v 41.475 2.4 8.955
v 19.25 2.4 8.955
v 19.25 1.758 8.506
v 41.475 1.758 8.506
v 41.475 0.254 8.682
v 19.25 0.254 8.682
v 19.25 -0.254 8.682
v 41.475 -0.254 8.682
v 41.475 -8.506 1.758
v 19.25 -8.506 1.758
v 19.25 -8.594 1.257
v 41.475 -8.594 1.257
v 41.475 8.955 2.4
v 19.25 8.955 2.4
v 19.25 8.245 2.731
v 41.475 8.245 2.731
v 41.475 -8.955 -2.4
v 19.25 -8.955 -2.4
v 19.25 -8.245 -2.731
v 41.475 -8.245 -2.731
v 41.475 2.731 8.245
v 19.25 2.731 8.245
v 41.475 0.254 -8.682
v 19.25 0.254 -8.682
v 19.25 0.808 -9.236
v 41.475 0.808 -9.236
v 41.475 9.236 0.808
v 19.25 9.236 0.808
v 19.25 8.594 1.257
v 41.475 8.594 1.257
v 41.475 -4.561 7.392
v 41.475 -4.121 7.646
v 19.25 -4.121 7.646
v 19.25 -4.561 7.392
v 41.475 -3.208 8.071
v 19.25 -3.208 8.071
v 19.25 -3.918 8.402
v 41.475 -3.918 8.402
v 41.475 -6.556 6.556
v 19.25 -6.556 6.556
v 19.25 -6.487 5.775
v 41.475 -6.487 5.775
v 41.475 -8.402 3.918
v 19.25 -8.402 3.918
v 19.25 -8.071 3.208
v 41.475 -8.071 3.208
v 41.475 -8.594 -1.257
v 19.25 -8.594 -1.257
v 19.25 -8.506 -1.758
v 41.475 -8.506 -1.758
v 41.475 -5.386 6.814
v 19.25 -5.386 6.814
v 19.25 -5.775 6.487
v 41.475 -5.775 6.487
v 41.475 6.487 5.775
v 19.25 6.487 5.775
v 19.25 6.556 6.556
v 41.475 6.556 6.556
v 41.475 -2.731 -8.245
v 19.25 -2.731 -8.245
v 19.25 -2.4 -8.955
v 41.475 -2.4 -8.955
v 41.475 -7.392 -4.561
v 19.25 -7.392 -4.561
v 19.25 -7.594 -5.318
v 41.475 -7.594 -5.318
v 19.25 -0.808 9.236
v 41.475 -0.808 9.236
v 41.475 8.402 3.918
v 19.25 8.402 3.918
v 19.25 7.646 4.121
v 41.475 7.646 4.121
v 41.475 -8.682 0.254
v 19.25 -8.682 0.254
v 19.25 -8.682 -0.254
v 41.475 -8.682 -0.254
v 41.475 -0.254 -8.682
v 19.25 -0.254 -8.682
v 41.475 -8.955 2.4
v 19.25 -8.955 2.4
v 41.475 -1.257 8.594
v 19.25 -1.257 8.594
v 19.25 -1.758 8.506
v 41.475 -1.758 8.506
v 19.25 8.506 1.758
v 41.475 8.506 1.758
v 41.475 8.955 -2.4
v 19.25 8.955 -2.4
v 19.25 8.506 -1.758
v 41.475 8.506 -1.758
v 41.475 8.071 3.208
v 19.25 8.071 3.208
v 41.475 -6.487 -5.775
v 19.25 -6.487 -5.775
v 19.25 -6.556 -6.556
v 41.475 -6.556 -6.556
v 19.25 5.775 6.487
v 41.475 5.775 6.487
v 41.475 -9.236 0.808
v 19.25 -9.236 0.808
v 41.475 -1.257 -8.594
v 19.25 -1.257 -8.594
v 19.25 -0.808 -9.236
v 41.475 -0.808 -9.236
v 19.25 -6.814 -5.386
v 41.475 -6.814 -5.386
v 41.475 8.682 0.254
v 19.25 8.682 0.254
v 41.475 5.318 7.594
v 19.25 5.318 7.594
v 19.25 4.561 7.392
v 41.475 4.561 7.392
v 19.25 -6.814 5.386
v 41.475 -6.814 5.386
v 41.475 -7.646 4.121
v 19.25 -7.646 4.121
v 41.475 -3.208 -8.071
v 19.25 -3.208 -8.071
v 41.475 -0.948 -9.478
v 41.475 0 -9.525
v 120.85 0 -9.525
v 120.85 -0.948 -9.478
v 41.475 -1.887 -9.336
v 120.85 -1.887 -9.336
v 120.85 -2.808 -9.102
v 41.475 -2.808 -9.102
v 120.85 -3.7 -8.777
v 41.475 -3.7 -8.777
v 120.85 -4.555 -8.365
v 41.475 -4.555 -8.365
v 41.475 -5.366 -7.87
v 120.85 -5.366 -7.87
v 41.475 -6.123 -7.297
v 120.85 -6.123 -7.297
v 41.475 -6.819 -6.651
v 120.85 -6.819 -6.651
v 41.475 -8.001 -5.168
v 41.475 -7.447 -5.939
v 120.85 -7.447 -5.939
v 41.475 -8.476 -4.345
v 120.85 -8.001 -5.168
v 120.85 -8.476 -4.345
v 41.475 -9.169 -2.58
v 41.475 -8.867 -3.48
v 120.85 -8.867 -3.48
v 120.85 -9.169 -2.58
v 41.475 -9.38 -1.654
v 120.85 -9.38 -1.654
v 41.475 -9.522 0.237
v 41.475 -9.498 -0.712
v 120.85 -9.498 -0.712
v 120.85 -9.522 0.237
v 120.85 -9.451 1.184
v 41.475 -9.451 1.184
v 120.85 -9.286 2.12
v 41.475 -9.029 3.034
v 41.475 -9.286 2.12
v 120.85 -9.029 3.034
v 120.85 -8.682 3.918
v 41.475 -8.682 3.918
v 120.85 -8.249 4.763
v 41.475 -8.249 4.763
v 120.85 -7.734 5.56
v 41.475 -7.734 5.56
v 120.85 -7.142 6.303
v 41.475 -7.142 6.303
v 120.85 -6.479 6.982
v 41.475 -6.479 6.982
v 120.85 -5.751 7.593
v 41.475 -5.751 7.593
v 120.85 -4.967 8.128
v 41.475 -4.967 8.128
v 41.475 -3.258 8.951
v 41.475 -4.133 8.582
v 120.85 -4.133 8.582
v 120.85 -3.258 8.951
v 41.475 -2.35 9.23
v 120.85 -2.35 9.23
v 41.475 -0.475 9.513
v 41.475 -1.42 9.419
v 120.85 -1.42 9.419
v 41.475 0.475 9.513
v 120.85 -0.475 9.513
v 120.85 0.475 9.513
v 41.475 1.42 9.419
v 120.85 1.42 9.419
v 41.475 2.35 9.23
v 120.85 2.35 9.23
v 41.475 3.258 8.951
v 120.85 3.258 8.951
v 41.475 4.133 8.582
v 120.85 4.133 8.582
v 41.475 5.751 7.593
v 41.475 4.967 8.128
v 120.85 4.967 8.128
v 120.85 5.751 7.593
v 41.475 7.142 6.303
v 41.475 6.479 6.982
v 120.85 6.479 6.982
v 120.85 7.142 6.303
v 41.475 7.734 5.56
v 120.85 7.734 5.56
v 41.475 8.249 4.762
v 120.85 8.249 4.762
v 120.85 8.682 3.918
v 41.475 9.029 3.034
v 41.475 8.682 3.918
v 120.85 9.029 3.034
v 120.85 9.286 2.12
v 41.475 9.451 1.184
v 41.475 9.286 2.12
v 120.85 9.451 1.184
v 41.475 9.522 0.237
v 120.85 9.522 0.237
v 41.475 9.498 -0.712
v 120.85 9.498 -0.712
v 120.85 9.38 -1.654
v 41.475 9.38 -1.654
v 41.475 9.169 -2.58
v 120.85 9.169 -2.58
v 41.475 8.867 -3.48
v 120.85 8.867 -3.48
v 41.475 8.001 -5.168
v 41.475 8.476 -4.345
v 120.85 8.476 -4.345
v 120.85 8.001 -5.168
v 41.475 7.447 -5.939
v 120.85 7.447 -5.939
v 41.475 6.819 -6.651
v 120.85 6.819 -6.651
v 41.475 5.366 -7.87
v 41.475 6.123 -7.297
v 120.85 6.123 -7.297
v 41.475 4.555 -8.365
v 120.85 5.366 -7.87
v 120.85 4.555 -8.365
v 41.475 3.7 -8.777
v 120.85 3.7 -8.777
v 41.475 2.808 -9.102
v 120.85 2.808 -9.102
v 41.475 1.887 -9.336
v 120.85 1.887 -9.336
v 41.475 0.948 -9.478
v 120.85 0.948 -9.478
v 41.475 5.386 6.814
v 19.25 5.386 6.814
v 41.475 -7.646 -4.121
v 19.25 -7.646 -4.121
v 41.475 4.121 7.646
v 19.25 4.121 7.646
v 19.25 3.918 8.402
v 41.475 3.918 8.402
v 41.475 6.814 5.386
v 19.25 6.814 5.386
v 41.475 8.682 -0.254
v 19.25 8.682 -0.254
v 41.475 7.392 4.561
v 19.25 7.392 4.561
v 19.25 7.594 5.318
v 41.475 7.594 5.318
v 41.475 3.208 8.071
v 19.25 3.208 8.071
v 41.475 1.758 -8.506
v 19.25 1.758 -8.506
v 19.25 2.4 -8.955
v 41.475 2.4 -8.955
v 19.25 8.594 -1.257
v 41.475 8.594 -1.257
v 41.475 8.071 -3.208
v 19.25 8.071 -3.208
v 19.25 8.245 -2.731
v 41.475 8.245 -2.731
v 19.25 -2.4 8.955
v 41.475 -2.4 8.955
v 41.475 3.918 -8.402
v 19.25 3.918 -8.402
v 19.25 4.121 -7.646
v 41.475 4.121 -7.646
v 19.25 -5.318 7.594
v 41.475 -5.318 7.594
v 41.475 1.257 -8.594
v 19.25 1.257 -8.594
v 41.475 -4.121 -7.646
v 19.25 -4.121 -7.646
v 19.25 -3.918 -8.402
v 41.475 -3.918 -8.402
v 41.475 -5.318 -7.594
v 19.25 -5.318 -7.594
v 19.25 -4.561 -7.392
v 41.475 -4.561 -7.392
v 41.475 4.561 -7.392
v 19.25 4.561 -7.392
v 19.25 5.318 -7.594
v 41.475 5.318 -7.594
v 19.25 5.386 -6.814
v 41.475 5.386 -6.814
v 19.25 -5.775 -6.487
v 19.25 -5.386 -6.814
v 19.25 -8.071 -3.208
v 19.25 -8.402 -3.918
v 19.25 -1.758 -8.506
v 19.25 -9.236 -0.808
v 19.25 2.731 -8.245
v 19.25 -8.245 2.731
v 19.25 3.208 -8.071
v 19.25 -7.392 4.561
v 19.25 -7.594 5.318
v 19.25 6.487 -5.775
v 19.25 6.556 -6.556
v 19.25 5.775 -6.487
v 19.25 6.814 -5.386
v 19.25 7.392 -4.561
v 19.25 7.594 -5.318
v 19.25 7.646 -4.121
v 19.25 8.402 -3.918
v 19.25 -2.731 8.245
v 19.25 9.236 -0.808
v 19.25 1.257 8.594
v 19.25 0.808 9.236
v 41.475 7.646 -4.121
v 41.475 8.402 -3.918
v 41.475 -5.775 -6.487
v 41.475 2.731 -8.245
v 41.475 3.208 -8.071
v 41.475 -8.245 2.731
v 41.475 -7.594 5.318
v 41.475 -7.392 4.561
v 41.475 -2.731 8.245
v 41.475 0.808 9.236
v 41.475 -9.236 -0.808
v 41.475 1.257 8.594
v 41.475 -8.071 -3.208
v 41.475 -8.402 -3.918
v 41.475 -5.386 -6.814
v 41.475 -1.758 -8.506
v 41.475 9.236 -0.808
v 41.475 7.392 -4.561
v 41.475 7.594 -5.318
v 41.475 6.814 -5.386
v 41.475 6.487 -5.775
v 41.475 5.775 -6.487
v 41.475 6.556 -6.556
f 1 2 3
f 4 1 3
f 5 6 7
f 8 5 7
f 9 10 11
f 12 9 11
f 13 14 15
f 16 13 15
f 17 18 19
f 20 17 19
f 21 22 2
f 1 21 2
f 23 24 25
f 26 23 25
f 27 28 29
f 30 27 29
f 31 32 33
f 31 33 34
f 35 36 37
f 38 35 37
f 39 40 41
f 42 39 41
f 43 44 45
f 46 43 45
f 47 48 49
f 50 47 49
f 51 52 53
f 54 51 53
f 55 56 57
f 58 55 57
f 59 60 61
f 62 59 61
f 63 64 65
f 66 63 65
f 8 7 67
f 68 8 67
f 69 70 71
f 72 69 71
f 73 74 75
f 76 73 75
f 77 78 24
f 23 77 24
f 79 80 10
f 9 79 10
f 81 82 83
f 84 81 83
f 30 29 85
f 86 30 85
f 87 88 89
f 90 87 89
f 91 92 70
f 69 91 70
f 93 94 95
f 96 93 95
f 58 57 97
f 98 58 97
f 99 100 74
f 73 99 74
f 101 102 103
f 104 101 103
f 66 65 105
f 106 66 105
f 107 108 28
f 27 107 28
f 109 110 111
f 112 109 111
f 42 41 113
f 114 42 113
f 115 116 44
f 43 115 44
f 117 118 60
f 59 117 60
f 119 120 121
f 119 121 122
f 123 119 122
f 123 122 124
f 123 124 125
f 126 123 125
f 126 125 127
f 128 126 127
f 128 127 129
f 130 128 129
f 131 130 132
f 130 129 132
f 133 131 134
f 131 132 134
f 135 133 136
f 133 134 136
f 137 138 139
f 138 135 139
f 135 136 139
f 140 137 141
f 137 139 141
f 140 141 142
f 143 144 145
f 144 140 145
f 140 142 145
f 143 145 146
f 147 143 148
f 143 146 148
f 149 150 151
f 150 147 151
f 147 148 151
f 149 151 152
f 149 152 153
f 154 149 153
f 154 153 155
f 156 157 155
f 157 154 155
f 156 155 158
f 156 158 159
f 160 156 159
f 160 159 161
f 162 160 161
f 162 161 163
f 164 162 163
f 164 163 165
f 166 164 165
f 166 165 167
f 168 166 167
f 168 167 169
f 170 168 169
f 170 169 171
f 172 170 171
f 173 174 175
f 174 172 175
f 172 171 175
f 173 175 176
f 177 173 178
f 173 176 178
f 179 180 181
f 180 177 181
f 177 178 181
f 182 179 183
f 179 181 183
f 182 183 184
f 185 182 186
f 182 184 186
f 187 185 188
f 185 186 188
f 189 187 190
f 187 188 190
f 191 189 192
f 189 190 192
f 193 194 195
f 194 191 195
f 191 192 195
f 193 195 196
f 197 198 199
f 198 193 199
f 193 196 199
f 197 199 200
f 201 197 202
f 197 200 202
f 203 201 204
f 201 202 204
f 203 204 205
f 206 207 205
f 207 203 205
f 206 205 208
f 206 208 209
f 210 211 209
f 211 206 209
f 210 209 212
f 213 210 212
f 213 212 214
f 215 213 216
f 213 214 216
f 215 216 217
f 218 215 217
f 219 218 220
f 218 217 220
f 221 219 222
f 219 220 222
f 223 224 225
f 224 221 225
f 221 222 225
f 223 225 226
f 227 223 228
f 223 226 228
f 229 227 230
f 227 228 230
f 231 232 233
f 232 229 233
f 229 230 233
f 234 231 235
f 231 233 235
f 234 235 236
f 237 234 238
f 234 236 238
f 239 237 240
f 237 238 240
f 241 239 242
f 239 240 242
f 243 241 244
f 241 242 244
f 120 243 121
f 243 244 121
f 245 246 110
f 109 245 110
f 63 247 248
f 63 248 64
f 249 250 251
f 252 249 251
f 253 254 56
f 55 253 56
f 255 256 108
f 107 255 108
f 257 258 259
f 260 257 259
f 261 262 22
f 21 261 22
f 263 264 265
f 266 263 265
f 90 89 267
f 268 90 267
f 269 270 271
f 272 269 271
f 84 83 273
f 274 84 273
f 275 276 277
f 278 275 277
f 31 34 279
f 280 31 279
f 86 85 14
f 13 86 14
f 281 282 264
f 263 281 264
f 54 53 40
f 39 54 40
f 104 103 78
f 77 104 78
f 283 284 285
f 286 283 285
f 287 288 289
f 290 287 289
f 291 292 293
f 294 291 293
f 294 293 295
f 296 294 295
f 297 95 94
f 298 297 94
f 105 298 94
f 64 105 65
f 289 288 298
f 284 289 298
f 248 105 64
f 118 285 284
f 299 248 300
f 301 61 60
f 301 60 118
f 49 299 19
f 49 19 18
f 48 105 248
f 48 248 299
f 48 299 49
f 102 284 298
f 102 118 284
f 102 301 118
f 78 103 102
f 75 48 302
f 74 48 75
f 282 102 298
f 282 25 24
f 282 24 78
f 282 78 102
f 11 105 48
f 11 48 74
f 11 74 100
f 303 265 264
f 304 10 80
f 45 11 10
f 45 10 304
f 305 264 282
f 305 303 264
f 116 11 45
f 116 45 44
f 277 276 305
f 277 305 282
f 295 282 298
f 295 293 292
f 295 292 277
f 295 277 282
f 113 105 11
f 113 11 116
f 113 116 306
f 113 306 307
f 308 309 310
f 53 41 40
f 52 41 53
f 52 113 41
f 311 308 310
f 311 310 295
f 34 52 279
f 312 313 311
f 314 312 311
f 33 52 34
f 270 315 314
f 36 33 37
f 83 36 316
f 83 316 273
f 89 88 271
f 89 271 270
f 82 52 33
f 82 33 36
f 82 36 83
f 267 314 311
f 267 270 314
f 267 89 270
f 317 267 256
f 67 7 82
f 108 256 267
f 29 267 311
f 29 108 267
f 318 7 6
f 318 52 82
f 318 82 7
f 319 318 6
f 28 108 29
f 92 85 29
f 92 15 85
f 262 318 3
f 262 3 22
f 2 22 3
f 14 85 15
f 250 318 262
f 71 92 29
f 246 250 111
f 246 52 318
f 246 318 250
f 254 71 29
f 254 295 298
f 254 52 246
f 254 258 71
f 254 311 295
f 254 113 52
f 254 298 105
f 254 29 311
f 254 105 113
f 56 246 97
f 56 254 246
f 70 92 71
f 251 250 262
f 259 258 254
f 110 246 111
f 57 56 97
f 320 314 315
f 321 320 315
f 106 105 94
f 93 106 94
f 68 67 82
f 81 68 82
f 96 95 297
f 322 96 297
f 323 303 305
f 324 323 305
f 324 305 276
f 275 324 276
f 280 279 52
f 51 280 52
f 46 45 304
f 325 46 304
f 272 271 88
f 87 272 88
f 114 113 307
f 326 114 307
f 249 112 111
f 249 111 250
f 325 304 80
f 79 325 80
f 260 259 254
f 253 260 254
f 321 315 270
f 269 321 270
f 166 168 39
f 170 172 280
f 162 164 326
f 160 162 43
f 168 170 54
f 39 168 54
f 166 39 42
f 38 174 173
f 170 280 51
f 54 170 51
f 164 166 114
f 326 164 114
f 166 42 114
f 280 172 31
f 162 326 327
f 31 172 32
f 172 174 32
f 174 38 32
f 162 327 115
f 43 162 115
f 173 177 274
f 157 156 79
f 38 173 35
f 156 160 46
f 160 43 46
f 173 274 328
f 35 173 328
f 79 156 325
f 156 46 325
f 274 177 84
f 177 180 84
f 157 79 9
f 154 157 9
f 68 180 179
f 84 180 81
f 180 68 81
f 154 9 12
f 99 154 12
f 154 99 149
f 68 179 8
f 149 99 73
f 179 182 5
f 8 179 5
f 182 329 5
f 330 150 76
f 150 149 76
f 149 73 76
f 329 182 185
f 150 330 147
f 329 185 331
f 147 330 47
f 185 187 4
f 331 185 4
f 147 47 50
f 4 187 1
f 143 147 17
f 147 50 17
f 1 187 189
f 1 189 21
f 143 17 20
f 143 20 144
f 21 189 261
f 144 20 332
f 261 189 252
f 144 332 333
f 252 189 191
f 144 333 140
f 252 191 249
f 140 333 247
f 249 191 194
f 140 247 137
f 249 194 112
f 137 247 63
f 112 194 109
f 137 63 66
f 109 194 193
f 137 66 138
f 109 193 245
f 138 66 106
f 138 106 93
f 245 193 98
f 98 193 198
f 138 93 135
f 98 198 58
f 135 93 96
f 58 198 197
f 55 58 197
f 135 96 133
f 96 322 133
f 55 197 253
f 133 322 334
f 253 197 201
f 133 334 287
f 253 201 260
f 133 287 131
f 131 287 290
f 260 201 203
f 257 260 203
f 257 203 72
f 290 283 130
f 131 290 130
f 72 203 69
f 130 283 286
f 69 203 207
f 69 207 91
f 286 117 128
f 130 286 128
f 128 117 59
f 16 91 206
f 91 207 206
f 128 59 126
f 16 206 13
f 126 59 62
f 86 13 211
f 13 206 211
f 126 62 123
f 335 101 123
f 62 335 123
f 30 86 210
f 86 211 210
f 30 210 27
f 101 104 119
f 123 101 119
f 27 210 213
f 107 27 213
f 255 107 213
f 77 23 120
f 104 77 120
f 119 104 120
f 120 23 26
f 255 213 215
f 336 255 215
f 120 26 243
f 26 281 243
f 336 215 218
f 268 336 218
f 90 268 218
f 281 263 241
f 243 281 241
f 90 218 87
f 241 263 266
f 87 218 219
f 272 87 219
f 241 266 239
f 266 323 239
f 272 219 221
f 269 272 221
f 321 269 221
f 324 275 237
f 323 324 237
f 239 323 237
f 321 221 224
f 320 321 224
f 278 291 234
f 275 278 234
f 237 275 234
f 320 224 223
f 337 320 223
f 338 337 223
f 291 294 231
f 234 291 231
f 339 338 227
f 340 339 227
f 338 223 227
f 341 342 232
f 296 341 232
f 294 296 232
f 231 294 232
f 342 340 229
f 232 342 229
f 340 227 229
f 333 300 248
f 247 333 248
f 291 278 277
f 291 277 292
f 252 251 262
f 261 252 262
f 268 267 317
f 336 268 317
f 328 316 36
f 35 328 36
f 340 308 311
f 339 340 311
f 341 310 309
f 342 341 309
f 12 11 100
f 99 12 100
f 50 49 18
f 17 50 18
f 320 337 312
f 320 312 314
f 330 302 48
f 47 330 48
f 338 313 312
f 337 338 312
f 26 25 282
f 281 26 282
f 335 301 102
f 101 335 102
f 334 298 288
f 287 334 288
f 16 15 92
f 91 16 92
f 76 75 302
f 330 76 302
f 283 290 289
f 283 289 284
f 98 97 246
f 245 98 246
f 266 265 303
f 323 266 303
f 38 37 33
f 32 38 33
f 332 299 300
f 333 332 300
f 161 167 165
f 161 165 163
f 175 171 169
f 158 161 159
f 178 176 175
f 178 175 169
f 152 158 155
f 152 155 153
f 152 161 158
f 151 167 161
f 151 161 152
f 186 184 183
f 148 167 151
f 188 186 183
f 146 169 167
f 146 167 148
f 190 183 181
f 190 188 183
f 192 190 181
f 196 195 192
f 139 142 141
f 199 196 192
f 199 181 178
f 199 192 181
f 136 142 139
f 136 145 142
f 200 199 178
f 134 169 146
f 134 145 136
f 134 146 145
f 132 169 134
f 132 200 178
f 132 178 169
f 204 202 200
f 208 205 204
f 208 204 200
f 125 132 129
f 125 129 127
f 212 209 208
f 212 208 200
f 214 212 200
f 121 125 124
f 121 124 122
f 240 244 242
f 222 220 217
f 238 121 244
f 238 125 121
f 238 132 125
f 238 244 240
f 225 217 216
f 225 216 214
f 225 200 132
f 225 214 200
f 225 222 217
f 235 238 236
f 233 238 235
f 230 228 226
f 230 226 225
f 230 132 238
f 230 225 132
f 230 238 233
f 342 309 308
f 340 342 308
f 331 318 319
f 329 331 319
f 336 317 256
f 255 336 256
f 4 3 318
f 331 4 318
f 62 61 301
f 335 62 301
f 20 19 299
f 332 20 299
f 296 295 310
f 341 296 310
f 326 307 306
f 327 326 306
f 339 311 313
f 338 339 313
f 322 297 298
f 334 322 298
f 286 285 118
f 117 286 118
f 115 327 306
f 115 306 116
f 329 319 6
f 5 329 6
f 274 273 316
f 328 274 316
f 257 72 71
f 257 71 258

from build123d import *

# Parameters (mm, degrees)
SKETCH1_W           = 120.675
SKETCH1_H           = 1.5875
CUT_EXTRUDE2_START  = 19.25
SKETCH4_R           = 12.7
CUT_EXTRUDE2_DEPTH  = 22.225
SKETCH6_R           = 7.9375
BOSS_EXTRUDE1_DEPTH = 101.6
SKETCH7_R           = 23.308025585
CUT_EXTRUDE3_DEPTH  = 19.075


with BuildPart() as part:
    # Sketch1 → Revolve1 (revolve)
    with BuildSketch(Plane(origin=(0, 0, 0), x_dir=(1, 0, 0), z_dir=(0, 1, 0))):
        with Locations((79.5875, 8.73125)):
            Rectangle(SKETCH1_W, SKETCH1_H)
    revolve(axis=Axis((157.324, 0, 0), (-1, 0, 0)))

    # Sketch4 → Cut-Extrude2 (cut)
    with BuildSketch(Plane(origin=(0, 0, 0), x_dir=(0, 0, -1), z_dir=(1, 0, 0)).offset(CUT_EXTRUDE2_START)):
        Circle(SKETCH4_R)
        Polygon((-9.235721046, 0.808020891), (-8.681700155, 0.254), (-8.681700155, -0.254), (-9.235721046, -0.808020891), (-8.593912259, -1.257420242), (-8.505698985, -1.75770258), (-8.955098336, -2.399511367), (-8.245002688, -2.730634406), (-8.071256455, -3.207998257), (-8.402379494, -3.918093905), (-7.645572882, -4.120879625), (-7.391572882, -4.56082053), (-7.594358603, -5.317627141), (-6.813836213, -5.385914002), (-6.487300108, -5.775064579), (-6.555586968, -6.555586968), (-5.775064579, -6.487300108), (-5.385914002, -6.813836213), (-5.317627141, -7.594358603), (-4.56082053, -7.391572882), (-4.120879625, -7.645572882), (-3.918093905, -8.402379494), (-3.207998257, -8.071256455), (-2.730634406, -8.245002688), (-2.399511367, -8.955098336), (-1.75770258, -8.505698985), (-1.257420242, -8.593912259), (-0.808020891, -9.235721046), (-0.254, -8.681700155), (0.254, -8.681700155), (0.808020891, -9.235721046), (1.257420242, -8.593912259), (1.75770258, -8.505698985), (2.399511367, -8.955098336), (2.730634406, -8.245002688), (3.207998257, -8.071256455), (3.918093905, -8.402379494), (4.120879625, -7.645572882), (4.56082053, -7.391572882), (5.317627141, -7.594358603), (5.385914002, -6.813836213), (5.775064579, -6.487300108), (6.555586968, -6.555586968), (6.487300108, -5.775064579), (6.813836213, -5.385914002), (7.594358603, -5.317627141), (7.391572882, -4.56082053), (7.645572882, -4.120879625), (8.402379494, -3.918093905), (8.071256455, -3.207998257), (8.245002688, -2.730634406), (8.955098336, -2.399511367), (8.505698985, -1.75770258), (8.593912259, -1.257420242), (9.235721046, -0.808020891), (8.681700155, -0.254), (8.681700155, 0.254), (9.235721046, 0.808020891), (8.593912259, 1.257420242), (8.505698985, 1.75770258), (8.955098336, 2.399511367), (8.245002688, 2.730634406), (8.071256455, 3.207998257), (8.402379494, 3.918093905), (7.645572882, 4.120879625), (7.391572882, 4.56082053), (7.594358603, 5.317627141), (6.813836213, 5.385914002), (6.487300108, 5.775064579), (6.555586968, 6.555586968), (5.775064579, 6.487300108), (5.385914002, 6.813836213), (5.317627141, 7.594358603), (4.56082053, 7.391572882), (4.120879625, 7.645572882), (3.918093905, 8.402379494), (3.207998257, 8.071256455), (2.730634406, 8.245002688), (2.399511367, 8.955098336), (1.75770258, 8.505698985), (1.257420242, 8.593912259), (0.808020891, 9.235721046), (0.254, 8.681700155), (-0.254, 8.681700155), (-0.808020891, 9.235721046), (-1.257420242, 8.593912259), (-1.75770258, 8.505698985), (-2.399511367, 8.955098336), (-2.730634406, 8.245002688), (-3.207998257, 8.071256455), (-3.918093905, 8.402379494), (-4.120879625, 7.645572882), (-4.56082053, 7.391572882), (-5.317627141, 7.594358603), (-5.385914002, 6.813836213), (-5.775064579, 6.487300108), (-6.555586968, 6.555586968), (-6.487300108, 5.775064579), (-6.813836213, 5.385914002), (-7.594358603, 5.317627141), (-7.391572882, 4.56082053), (-7.645572882, 4.120879625), (-8.402379494, 3.918093905), (-8.071256455, 3.207998257), (-8.245002688, 2.730634406), (-8.955098336, 2.399511367), (-8.505698985, 1.75770258), (-8.593912259, 1.257420242), align=None, mode=Mode.SUBTRACT)
    extrude(amount=CUT_EXTRUDE2_DEPTH, mode=Mode.SUBTRACT)

    # Sketch6 → Boss-Extrude1 (add)
    with BuildSketch(Plane.ZY.offset(-19.25)):
        Circle(SKETCH6_R)
    extrude(amount=-BOSS_EXTRUDE1_DEPTH)

    # Sketch7 → Cut-Extrude3 (cut)
    with BuildSketch(Plane(origin=(120.85, 0, 0), x_dir=(0, 0, -1), z_dir=(1, 0, 0))):
        Circle(SKETCH7_R)
    extrude(amount=CUT_EXTRUDE3_DEPTH, mode=Mode.SUBTRACT)


solid = part.part
